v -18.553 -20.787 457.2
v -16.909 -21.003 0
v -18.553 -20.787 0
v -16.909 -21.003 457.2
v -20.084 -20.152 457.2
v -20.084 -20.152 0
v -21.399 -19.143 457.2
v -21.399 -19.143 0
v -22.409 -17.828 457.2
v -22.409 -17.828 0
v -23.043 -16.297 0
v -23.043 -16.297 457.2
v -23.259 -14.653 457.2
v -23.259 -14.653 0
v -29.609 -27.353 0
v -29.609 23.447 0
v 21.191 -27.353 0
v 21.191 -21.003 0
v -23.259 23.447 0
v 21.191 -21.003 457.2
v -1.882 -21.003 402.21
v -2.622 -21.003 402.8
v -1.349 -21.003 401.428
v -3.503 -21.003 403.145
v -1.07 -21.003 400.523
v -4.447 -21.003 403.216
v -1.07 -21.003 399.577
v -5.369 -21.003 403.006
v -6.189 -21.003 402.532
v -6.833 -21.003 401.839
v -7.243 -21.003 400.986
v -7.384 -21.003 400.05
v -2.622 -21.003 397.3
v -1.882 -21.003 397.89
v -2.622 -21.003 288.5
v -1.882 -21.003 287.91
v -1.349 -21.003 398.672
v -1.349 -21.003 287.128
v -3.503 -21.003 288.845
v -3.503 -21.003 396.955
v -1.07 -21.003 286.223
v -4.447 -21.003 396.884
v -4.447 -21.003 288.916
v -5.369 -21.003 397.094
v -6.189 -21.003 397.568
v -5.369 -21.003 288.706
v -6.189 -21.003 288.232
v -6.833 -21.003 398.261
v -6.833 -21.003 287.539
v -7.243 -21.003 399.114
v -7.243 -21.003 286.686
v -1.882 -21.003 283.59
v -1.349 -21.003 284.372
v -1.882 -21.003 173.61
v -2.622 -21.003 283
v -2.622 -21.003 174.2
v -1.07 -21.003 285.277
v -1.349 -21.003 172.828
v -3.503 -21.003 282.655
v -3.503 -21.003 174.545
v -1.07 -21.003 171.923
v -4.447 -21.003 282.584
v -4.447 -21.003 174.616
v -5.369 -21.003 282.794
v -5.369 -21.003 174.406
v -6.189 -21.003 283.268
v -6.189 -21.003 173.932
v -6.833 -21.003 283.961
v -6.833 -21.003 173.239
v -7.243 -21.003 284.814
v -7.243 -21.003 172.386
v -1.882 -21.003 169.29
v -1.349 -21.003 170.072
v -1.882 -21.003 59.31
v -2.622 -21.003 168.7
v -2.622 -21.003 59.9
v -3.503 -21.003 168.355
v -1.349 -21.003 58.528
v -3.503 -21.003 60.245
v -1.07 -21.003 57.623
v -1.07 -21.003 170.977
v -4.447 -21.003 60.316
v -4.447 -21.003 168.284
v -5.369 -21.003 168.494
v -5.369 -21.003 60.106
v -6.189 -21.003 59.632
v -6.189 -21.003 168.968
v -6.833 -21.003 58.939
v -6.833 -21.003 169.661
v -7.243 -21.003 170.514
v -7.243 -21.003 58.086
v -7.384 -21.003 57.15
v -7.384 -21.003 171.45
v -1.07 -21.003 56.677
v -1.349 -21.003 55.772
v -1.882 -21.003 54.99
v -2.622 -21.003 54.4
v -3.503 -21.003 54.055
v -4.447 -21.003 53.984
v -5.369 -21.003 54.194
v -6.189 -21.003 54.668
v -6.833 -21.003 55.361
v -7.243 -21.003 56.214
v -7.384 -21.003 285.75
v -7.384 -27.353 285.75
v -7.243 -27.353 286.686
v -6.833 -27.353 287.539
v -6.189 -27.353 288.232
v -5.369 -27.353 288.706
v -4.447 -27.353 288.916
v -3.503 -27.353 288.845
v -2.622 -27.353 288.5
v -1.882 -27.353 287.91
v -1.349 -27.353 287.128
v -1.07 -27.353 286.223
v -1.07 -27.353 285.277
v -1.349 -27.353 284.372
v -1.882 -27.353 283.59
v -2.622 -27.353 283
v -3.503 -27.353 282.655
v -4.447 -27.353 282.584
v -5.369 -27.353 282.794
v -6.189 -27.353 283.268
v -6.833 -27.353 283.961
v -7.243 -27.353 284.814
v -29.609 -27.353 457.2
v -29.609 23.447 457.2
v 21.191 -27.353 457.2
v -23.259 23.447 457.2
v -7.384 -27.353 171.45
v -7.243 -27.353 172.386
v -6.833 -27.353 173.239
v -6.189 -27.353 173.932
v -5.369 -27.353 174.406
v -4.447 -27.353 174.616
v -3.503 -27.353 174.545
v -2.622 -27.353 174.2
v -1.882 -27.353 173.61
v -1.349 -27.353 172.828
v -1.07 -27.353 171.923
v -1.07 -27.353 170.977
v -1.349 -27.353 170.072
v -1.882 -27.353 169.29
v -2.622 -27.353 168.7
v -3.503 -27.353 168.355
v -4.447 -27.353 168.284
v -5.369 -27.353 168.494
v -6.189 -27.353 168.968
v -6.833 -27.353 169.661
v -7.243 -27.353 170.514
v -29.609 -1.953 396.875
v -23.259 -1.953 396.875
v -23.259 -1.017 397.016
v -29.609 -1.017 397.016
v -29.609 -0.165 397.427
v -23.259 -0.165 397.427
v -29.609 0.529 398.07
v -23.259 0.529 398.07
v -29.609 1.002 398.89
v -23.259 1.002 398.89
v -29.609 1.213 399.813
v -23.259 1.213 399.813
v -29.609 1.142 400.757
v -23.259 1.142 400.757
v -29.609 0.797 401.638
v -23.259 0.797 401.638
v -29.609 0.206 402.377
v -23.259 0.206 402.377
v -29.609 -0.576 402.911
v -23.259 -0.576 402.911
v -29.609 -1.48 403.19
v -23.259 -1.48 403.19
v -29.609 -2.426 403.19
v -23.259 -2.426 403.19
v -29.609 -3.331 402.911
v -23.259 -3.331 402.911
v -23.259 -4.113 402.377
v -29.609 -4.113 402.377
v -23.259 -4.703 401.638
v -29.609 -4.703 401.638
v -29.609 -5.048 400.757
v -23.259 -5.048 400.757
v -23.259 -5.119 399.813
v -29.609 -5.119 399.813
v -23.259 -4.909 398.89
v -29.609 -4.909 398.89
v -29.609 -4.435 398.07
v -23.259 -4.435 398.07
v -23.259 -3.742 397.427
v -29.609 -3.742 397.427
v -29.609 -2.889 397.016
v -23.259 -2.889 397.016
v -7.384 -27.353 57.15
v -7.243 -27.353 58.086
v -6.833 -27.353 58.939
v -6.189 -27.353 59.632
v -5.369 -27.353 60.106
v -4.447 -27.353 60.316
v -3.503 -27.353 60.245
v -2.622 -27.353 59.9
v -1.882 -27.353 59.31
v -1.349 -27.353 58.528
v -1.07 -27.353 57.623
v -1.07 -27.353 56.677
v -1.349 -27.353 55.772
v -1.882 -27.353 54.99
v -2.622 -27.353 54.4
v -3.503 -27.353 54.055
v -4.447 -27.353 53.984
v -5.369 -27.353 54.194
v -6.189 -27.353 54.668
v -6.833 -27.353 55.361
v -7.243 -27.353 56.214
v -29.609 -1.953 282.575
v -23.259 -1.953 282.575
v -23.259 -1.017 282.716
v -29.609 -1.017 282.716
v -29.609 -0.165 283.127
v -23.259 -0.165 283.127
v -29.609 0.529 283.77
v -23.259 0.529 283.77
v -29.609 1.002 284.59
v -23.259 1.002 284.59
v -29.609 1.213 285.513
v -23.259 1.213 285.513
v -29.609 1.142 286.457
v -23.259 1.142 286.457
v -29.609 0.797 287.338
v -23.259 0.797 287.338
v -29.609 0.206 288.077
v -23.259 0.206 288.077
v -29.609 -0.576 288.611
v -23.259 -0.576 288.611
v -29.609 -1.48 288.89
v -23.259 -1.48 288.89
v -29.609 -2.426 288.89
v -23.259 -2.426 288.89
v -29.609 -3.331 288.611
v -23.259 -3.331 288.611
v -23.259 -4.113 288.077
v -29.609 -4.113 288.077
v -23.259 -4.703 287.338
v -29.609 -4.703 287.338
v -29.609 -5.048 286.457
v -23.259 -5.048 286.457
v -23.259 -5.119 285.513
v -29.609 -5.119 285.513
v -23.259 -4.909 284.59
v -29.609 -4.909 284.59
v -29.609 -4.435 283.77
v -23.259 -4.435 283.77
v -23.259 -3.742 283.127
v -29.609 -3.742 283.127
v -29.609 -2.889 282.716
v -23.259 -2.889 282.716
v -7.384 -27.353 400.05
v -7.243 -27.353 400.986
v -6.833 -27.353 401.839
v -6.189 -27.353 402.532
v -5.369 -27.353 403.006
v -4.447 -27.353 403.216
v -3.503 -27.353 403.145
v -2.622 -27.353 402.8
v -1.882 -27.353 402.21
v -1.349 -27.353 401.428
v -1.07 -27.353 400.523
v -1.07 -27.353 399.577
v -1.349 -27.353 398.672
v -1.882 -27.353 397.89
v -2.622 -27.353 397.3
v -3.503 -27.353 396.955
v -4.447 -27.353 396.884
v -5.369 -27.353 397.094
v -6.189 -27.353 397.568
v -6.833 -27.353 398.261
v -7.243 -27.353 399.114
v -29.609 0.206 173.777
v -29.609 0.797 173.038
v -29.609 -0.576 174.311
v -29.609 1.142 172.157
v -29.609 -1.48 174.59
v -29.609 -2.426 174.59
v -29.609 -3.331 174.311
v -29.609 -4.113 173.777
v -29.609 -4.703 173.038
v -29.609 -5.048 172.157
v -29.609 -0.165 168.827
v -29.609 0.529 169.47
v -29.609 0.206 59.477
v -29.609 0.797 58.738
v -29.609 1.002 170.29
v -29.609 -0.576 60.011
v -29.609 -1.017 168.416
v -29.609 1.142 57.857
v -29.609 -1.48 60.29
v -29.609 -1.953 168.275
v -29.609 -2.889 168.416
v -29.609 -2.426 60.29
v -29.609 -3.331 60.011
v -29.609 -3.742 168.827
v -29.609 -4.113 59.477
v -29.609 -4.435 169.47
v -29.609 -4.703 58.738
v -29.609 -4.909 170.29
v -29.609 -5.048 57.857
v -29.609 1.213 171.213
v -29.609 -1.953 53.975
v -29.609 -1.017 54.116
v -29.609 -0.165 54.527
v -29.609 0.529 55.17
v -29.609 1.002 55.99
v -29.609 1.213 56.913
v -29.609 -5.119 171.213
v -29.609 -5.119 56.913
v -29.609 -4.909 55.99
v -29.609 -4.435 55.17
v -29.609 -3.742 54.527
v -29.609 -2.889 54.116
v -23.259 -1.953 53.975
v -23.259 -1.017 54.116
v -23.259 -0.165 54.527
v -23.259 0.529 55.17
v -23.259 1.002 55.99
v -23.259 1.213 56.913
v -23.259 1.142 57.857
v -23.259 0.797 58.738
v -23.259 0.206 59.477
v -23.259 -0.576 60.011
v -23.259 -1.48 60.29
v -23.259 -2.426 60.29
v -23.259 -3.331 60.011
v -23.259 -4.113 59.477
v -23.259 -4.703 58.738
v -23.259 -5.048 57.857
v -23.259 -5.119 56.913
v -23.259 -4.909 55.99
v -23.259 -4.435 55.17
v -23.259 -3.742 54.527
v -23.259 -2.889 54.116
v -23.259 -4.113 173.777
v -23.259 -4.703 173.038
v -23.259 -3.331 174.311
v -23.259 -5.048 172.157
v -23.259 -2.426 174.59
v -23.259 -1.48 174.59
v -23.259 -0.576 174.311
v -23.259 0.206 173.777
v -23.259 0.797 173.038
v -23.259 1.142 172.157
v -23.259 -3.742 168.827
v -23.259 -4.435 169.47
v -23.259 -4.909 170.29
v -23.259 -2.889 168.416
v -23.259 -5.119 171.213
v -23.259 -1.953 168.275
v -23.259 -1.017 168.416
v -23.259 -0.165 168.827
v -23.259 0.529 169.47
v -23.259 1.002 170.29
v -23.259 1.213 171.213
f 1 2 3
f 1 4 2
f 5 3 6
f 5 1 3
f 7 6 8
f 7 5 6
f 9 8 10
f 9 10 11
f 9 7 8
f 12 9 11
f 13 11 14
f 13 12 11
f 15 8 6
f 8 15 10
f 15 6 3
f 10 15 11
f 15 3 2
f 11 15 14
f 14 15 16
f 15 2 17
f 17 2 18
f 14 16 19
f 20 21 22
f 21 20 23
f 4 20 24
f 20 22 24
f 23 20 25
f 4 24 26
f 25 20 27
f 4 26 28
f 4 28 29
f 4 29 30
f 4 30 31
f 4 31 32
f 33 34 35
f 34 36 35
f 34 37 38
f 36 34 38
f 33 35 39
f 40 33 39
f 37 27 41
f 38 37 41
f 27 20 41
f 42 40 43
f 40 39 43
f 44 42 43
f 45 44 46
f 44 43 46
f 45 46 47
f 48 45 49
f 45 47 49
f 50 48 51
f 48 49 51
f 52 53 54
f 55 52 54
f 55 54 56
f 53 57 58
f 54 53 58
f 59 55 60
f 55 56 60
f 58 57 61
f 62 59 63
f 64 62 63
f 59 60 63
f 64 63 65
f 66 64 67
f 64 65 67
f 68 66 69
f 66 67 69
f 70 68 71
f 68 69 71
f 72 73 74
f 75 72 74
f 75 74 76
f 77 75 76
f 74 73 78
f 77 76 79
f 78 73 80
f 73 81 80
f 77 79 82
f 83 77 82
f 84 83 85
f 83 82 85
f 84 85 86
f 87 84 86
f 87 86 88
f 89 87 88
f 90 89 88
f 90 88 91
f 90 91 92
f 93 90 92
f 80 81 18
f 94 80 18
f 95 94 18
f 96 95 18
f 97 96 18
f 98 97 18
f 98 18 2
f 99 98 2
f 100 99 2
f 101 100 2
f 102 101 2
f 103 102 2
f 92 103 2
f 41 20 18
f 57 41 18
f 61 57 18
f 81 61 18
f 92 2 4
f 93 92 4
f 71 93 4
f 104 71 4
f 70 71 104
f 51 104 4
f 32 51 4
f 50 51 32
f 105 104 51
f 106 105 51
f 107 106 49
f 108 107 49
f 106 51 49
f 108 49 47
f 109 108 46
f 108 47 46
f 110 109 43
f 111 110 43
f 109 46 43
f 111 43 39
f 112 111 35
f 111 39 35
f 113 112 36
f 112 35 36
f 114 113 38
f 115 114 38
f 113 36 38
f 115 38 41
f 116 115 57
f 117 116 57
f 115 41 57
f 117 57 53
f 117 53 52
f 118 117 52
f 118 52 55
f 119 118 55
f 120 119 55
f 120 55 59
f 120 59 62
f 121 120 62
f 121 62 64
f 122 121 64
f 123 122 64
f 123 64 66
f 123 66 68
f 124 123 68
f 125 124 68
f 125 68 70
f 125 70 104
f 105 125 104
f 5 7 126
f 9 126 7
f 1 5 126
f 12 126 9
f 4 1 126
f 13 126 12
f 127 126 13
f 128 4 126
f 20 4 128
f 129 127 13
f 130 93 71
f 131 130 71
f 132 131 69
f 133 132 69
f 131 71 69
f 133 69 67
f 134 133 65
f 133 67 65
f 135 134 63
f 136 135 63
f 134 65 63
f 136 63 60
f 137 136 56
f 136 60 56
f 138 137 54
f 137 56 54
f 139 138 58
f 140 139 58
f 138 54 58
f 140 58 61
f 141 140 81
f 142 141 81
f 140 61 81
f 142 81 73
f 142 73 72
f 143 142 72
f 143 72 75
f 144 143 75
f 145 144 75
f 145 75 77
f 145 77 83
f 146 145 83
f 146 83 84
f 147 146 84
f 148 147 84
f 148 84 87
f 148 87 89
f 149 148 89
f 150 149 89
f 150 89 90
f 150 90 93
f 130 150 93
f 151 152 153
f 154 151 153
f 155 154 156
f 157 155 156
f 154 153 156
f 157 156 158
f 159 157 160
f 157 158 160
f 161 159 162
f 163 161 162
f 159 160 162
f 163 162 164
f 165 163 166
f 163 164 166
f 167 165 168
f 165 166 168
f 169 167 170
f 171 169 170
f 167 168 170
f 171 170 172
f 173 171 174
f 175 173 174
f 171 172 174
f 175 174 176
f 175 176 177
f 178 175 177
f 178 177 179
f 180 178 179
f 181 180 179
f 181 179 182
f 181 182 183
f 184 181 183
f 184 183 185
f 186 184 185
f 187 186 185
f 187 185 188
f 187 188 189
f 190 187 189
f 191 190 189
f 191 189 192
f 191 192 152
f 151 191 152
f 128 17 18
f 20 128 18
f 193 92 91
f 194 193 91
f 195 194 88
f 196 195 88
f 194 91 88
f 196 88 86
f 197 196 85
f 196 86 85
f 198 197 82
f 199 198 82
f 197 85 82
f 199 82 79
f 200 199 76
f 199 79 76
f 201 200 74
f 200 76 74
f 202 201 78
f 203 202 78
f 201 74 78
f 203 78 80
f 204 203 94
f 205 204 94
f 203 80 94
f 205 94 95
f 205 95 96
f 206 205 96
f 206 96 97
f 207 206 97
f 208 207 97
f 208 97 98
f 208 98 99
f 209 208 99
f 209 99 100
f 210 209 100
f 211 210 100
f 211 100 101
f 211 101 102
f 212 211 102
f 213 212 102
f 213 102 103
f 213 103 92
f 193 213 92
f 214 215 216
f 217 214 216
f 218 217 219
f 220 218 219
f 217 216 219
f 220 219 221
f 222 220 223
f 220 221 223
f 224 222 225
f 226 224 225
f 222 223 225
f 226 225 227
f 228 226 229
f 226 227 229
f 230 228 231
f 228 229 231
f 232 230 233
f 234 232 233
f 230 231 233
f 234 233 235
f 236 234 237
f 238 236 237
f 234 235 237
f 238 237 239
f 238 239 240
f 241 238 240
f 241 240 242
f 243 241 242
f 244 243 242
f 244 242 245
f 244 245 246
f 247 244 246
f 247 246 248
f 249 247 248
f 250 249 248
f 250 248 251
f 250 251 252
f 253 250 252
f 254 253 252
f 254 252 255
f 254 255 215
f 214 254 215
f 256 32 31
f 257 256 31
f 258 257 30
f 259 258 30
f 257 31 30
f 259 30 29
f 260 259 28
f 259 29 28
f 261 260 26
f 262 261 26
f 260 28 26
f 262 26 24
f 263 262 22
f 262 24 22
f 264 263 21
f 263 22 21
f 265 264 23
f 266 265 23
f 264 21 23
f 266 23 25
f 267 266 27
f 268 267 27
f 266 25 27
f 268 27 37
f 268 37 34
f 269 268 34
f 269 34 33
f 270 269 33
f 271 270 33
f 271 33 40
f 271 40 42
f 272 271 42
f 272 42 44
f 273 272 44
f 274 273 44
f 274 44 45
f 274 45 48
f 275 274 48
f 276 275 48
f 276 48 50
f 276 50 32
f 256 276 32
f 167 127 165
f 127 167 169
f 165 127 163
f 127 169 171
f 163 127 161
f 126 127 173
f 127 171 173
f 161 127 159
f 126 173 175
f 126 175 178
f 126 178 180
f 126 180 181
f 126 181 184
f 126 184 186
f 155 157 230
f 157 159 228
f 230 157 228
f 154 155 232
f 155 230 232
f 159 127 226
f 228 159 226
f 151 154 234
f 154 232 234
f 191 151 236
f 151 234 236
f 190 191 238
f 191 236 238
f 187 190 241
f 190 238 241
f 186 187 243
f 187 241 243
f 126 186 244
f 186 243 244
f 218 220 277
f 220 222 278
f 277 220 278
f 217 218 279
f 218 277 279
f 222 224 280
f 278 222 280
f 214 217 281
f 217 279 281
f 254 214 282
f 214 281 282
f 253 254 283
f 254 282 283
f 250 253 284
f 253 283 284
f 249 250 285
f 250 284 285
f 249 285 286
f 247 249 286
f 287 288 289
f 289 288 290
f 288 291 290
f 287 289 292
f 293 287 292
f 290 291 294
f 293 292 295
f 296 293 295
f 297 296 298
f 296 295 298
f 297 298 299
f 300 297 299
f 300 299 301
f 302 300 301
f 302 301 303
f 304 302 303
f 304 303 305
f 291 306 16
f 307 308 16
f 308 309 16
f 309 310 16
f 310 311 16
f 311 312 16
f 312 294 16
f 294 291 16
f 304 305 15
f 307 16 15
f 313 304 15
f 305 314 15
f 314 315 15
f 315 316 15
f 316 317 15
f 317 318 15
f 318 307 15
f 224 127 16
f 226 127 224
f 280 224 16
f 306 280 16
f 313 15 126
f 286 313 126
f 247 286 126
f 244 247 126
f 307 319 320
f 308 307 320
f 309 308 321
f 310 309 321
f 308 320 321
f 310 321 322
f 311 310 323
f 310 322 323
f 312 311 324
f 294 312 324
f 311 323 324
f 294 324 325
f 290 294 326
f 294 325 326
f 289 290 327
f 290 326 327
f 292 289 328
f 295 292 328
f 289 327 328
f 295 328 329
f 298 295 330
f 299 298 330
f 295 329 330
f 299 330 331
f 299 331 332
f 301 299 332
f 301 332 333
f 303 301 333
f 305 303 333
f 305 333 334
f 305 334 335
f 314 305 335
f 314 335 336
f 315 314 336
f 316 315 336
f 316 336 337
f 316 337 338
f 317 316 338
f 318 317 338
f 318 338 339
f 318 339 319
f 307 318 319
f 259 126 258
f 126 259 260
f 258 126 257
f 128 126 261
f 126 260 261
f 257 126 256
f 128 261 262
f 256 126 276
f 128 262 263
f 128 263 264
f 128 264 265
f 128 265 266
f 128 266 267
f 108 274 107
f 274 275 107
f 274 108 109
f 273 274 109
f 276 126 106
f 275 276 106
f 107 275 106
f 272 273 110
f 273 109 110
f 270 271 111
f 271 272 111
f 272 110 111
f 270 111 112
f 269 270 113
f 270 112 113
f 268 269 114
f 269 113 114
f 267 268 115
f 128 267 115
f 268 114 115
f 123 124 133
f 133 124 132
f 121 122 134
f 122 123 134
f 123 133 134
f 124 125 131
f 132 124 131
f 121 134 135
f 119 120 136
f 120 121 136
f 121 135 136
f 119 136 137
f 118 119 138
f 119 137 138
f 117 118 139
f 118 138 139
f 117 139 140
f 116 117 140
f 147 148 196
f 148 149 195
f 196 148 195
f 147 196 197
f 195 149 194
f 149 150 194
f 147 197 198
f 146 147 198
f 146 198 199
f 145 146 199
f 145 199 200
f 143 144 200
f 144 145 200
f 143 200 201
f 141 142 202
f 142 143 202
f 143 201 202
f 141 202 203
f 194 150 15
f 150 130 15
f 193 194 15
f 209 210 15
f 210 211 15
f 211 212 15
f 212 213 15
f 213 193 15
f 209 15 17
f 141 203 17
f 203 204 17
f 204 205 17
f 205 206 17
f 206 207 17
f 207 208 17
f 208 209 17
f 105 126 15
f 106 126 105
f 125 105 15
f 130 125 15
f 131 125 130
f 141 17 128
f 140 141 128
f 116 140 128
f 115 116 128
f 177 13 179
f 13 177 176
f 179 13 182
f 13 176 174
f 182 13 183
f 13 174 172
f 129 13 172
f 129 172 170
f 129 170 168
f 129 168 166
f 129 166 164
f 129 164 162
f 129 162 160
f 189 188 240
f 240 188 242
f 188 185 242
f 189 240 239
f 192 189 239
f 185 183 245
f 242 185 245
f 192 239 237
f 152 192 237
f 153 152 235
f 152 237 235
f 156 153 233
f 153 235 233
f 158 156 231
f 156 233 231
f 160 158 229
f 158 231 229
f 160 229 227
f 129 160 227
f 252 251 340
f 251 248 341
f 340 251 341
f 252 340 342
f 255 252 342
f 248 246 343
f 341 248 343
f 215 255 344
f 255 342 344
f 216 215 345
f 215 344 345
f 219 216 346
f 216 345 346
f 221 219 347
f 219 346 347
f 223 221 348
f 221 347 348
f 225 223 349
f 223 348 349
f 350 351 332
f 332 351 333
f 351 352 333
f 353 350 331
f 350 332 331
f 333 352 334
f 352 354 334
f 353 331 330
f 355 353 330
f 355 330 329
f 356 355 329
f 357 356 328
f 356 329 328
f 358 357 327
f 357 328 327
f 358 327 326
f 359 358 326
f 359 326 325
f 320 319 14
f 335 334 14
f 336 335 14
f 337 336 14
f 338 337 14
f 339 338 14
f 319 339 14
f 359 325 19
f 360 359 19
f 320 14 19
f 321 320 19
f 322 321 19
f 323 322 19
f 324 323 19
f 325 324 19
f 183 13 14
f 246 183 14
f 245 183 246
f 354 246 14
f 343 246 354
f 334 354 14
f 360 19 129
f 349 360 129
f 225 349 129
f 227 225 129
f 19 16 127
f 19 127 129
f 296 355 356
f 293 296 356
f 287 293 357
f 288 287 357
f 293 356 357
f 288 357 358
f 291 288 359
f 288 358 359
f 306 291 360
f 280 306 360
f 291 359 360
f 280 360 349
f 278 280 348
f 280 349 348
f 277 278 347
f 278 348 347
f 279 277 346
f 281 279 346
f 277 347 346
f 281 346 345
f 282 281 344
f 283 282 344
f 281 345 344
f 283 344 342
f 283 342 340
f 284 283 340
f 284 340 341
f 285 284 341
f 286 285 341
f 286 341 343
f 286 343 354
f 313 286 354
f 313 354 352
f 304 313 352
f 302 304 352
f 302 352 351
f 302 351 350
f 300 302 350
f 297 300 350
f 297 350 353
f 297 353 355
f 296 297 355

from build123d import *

# Parameters (mm, degrees)
SKETCH1_W                   = 6.35
SKETCH1_H                   = 44.45
BOSS_EXTRUDE1_DEPTH         = 457.2
FILLET1_R                   = 6.35
F_1_4_0_25_DIAMETER_HOLE1_D = 6.35
LPATTERN1_COUNT             = 4
LPATTERN1_PITCH             = 114.3
F_1_4_0_25_DIAMETER_HOLE2_D = 6.35
LPATTERN2_COUNT             = 4
LPATTERN2_PITCH             = 114.3


with BuildPart() as part:
    # Sketch1 → Boss-Extrude1 (new body)
    with BuildSketch(Plane.XY):
        with Locations((-26.434360713, 1.221912767)):
            Rectangle(SKETCH1_W, SKETCH1_H)
        Polygon((-23.259360713, -21.003087233), (-29.609360713, -21.003087233), (-29.609360713, -27.353087233), (21.190639287, -27.353087233), (21.190639287, -21.003087233), align=None)
    extrude(amount=BOSS_EXTRUDE1_DEPTH)

    # Fillet1
    fillet1_edges = [part.edges().sort_by_distance(p)[0] for p in [
        (-23.259360713, -21.003087233, 228.6),
    ]]
    fillet(fillet1_edges, radius=FILLET1_R)

    # 1/4 (0.25) Diameter Hole1 (through all)
    with Locations(Plane.XZ.offset(27.353087233)):
        with Locations((-4.209360713, 400.05)):
            f_1_4_0_25_diameter_hole1 = Hole(F_1_4_0_25_DIAMETER_HOLE1_D / 2)

    # LPattern1: 1/4 (0.25) Diameter Hole1 ×4
    with Locations(*[(0, 0, -i * LPATTERN1_PITCH) for i in range(1, LPATTERN1_COUNT)]):
        add(f_1_4_0_25_diameter_hole1, mode=Mode.SUBTRACT)

    # 1/4 (0.25) Diameter Hole2 (through all)
    with Locations(Plane.ZY.offset(29.609360713)):
        with Locations((400.05, -1.953087233)):
            f_1_4_0_25_diameter_hole2 = Hole(F_1_4_0_25_DIAMETER_HOLE2_D / 2)

    # LPattern2: 1/4 (0.25) Diameter Hole2 ×4
    with Locations(*[(0, 0, -i * LPATTERN2_PITCH) for i in range(1, LPATTERN2_COUNT)]):
        add(f_1_4_0_25_diameter_hole2, mode=Mode.SUBTRACT)


solid = part.part
